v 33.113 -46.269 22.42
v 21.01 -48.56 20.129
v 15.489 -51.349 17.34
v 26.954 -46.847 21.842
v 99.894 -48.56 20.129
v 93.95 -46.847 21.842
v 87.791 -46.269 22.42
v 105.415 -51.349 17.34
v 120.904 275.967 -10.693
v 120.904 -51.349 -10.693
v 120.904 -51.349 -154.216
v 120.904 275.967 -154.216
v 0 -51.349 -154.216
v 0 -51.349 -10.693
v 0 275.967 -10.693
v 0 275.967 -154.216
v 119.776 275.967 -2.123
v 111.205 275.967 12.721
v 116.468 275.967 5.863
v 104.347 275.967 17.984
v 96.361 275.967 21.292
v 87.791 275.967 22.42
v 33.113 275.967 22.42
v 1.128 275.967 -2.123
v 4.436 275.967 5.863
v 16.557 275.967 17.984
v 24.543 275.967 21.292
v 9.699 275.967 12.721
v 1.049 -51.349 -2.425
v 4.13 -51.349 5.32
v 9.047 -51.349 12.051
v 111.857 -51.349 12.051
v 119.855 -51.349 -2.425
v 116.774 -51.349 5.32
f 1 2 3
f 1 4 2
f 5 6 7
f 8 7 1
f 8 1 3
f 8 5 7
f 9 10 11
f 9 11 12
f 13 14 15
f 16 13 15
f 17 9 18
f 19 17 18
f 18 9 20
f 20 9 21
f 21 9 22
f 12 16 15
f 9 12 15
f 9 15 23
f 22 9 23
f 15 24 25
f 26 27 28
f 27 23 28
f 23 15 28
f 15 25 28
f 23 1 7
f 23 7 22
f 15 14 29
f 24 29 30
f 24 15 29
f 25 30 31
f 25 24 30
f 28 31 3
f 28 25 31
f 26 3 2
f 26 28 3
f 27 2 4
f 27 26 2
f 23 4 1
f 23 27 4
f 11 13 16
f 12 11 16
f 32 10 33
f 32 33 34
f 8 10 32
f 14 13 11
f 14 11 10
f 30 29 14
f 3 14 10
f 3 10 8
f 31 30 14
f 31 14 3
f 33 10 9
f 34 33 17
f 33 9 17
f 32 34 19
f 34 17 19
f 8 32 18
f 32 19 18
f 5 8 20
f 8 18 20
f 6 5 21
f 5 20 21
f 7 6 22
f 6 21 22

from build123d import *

# Parameters (mm, degrees)
F0_W     = 327.316575
F0_H     = 176.636189
F1_DEPTH = 120.904
F2_SIZE  = 5.08
F3_R     = 33.113353


with BuildPart() as f1:
    # F0 (on Right) → F1 (new body)
    with BuildSketch(Plane.YZ):
        with Locations((112.309161, -65.898135)):
            Rectangle(F0_W, F0_H)
    extrude(amount=F1_DEPTH)

    # F2
    f2_edges = [f1.edges().sort_by_distance(p)[0] for p in [
        (60.452, -51.349126, 22.419959),
    ]]
    chamfer(f2_edges, length=F2_SIZE)

    # F3
    f3_edges = [f1.edges().sort_by_distance(p)[0] for p in [
        (120.904, 114.849162, 22.419959),
        (0, 114.849162, 22.419959),
    ]]
    fillet(f3_edges, radius=F3_R)


solid = f1.part
